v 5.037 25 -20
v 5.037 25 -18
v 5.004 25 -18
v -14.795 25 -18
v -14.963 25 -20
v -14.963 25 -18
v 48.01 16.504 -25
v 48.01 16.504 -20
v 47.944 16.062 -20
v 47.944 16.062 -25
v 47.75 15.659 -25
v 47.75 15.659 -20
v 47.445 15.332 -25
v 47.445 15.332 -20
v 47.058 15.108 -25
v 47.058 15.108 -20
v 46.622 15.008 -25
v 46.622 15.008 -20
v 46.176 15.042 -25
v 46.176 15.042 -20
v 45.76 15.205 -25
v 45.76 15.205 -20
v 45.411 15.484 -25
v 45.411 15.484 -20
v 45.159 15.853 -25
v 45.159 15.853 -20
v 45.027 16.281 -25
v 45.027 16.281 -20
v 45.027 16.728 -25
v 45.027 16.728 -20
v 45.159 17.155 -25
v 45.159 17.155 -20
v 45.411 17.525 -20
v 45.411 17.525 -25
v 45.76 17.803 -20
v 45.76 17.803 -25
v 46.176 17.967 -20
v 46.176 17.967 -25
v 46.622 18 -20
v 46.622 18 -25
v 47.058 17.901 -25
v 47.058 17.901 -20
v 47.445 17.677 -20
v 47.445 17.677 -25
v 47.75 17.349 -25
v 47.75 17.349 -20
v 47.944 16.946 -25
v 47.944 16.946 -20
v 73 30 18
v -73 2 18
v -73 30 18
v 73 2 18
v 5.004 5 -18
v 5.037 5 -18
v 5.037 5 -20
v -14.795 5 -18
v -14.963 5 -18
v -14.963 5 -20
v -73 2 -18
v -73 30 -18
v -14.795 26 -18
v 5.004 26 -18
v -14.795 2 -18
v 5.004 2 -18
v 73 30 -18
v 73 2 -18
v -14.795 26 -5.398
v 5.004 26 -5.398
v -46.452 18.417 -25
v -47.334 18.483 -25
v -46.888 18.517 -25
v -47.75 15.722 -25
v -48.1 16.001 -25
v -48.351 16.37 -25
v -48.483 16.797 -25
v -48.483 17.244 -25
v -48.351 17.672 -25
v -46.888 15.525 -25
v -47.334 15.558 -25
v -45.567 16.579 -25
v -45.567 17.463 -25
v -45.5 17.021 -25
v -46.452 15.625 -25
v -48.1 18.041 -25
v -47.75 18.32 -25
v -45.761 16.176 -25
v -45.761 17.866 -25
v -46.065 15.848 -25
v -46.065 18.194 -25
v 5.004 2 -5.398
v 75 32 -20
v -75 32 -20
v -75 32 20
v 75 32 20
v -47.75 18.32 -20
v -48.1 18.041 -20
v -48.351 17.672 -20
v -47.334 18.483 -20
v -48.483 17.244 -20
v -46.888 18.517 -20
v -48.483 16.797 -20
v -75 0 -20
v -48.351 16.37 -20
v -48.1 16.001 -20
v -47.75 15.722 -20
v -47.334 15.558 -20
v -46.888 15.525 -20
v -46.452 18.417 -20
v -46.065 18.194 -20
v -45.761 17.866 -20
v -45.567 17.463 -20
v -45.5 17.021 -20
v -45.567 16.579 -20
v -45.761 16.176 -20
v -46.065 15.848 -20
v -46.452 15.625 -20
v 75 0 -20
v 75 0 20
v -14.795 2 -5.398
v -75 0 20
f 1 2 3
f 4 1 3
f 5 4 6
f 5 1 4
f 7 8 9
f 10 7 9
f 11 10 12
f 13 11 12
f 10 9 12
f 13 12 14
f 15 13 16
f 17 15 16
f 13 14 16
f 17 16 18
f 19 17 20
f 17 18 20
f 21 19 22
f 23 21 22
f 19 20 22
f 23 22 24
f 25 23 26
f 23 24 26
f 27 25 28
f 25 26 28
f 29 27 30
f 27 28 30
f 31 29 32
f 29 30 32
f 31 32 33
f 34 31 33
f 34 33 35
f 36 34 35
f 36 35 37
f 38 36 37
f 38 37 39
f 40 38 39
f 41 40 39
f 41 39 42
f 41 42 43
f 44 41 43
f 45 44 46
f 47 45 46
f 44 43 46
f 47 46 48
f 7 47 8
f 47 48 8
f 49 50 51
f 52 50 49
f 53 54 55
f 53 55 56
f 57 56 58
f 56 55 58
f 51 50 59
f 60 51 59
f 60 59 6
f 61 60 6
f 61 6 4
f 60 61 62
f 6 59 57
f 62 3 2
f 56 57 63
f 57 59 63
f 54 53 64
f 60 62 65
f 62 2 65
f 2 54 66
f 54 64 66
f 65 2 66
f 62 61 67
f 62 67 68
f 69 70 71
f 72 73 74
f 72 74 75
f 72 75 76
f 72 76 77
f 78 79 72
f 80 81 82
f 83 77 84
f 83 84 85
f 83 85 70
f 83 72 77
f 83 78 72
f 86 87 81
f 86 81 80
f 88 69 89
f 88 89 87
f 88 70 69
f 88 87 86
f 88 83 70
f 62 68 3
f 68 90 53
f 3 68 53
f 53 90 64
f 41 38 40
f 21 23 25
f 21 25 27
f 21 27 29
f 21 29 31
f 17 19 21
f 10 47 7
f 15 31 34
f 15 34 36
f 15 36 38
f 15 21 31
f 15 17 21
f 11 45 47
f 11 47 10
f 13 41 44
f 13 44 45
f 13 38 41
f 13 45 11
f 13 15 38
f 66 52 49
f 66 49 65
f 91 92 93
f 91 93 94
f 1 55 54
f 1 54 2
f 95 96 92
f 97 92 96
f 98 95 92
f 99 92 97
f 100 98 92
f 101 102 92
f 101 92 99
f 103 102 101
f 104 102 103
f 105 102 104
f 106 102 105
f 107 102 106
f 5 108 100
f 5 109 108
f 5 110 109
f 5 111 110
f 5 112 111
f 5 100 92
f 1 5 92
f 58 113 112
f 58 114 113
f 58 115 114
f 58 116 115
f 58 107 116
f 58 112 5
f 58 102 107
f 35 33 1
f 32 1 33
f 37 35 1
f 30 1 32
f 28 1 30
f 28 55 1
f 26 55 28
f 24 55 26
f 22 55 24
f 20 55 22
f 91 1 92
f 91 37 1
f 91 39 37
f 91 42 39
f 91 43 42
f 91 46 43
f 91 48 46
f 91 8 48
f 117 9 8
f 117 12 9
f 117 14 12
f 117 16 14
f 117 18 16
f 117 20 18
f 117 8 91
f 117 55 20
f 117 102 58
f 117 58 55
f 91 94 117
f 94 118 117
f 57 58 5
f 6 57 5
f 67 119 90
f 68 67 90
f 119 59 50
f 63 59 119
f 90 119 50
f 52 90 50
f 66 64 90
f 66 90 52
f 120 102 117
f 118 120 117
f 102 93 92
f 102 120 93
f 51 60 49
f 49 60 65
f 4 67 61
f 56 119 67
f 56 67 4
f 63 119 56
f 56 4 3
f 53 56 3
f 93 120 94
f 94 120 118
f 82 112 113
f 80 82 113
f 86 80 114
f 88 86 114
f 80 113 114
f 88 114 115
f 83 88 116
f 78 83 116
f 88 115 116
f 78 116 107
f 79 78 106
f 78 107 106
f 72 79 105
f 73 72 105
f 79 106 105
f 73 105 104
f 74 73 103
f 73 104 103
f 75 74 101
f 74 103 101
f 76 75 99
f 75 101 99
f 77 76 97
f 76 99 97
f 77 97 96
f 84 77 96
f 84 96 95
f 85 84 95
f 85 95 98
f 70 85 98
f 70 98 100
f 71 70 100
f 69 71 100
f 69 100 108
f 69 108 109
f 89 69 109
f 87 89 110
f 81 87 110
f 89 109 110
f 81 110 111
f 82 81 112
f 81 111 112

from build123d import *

# Parameters (mm, degrees)
SKETCH1_W           = 150
SKETCH1_H           = 40
BOSS_EXTRUDE1_DEPTH = 30
SHELL3_T            = -2
SKETCH3_W           = 20
SKETCH3_H           = 20
CUT_EXTRUDE1_DEPTH  = 5
SKETCH6_W           = 19.798687527
SKETCH6_H           = 12.601964569
BOSS_EXTRUDE3_DEPTH = 24
SKETCH7_W           = 150
SKETCH7_H           = 40
BOSS_EXTRUDE4_DEPTH = 2
SKETCH8_R           = 1.5
BOSS_EXTRUDE5_DEPTH = 5
SKETCH9_R           = 1.5
BOSS_EXTRUDE6_DEPTH = 5


with BuildPart() as part:
    # Sketch1 → Boss-Extrude1 (new body)
    with BuildSketch(Plane(origin=(0, 0, 0), x_dir=(1, 0, 0), z_dir=(0, 1, 0))):
        Rectangle(SKETCH1_W, SKETCH1_H)
    extrude(amount=BOSS_EXTRUDE1_DEPTH)

    # Shell3
    shell3_openings = [part.faces().sort_by_distance(p)[0] for p in [
        (0, 30, 0),
    ]]
    offset(amount=SHELL3_T, openings=shell3_openings, kind=Kind.INTERSECTION)

    # Sketch3 → Cut-Extrude1 (cut)
    with BuildSketch(Plane(origin=(0, 0, -20), x_dir=(-1, 0, 0), z_dir=(0, 0, -1))):
        with Locations((4.963499303, 15)):
            Rectangle(SKETCH3_W, SKETCH3_H)
    extrude(amount=-CUT_EXTRUDE1_DEPTH, mode=Mode.SUBTRACT)

    # Sketch6 → Boss-Extrude3 (add)
    with BuildSketch(Plane(origin=(0, 2, 0), x_dir=(1, 0, 0), z_dir=(0, 1, 0))):
        with Locations((-4.895398538, 11.699017716)):
            Rectangle(SKETCH6_W, SKETCH6_H)
    extrude(amount=BOSS_EXTRUDE3_DEPTH)

    # Sketch7 → Boss-Extrude4 (add)
    with BuildSketch(Plane(origin=(0, 30, 0), x_dir=(1, 0, 0), z_dir=(0, 1, 0))):
        Rectangle(SKETCH7_W, SKETCH7_H)
    extrude(amount=BOSS_EXTRUDE4_DEPTH)

    # Sketch8 → Boss-Extrude5 (add)
    with BuildSketch(Plane(origin=(0, 0, -20), x_dir=(-1, 0, 0), z_dir=(0, 0, -1))):
        with Locations(Location((-46.510205531, 16.504268765, 0), (0, 0, 180))):
            Circle(SKETCH8_R)
    extrude(amount=BOSS_EXTRUDE5_DEPTH)

    # Sketch9 → Boss-Extrude6 (add)
    with BuildSketch(Plane(origin=(0, 0, -20), x_dir=(-1, 0, 0), z_dir=(0, 0, -1))):
        with Locations(Location((47, 17.020870221, 0), (0, 0, 180))):
            Circle(SKETCH9_R)
    extrude(amount=BOSS_EXTRUDE6_DEPTH)


solid = part.part
